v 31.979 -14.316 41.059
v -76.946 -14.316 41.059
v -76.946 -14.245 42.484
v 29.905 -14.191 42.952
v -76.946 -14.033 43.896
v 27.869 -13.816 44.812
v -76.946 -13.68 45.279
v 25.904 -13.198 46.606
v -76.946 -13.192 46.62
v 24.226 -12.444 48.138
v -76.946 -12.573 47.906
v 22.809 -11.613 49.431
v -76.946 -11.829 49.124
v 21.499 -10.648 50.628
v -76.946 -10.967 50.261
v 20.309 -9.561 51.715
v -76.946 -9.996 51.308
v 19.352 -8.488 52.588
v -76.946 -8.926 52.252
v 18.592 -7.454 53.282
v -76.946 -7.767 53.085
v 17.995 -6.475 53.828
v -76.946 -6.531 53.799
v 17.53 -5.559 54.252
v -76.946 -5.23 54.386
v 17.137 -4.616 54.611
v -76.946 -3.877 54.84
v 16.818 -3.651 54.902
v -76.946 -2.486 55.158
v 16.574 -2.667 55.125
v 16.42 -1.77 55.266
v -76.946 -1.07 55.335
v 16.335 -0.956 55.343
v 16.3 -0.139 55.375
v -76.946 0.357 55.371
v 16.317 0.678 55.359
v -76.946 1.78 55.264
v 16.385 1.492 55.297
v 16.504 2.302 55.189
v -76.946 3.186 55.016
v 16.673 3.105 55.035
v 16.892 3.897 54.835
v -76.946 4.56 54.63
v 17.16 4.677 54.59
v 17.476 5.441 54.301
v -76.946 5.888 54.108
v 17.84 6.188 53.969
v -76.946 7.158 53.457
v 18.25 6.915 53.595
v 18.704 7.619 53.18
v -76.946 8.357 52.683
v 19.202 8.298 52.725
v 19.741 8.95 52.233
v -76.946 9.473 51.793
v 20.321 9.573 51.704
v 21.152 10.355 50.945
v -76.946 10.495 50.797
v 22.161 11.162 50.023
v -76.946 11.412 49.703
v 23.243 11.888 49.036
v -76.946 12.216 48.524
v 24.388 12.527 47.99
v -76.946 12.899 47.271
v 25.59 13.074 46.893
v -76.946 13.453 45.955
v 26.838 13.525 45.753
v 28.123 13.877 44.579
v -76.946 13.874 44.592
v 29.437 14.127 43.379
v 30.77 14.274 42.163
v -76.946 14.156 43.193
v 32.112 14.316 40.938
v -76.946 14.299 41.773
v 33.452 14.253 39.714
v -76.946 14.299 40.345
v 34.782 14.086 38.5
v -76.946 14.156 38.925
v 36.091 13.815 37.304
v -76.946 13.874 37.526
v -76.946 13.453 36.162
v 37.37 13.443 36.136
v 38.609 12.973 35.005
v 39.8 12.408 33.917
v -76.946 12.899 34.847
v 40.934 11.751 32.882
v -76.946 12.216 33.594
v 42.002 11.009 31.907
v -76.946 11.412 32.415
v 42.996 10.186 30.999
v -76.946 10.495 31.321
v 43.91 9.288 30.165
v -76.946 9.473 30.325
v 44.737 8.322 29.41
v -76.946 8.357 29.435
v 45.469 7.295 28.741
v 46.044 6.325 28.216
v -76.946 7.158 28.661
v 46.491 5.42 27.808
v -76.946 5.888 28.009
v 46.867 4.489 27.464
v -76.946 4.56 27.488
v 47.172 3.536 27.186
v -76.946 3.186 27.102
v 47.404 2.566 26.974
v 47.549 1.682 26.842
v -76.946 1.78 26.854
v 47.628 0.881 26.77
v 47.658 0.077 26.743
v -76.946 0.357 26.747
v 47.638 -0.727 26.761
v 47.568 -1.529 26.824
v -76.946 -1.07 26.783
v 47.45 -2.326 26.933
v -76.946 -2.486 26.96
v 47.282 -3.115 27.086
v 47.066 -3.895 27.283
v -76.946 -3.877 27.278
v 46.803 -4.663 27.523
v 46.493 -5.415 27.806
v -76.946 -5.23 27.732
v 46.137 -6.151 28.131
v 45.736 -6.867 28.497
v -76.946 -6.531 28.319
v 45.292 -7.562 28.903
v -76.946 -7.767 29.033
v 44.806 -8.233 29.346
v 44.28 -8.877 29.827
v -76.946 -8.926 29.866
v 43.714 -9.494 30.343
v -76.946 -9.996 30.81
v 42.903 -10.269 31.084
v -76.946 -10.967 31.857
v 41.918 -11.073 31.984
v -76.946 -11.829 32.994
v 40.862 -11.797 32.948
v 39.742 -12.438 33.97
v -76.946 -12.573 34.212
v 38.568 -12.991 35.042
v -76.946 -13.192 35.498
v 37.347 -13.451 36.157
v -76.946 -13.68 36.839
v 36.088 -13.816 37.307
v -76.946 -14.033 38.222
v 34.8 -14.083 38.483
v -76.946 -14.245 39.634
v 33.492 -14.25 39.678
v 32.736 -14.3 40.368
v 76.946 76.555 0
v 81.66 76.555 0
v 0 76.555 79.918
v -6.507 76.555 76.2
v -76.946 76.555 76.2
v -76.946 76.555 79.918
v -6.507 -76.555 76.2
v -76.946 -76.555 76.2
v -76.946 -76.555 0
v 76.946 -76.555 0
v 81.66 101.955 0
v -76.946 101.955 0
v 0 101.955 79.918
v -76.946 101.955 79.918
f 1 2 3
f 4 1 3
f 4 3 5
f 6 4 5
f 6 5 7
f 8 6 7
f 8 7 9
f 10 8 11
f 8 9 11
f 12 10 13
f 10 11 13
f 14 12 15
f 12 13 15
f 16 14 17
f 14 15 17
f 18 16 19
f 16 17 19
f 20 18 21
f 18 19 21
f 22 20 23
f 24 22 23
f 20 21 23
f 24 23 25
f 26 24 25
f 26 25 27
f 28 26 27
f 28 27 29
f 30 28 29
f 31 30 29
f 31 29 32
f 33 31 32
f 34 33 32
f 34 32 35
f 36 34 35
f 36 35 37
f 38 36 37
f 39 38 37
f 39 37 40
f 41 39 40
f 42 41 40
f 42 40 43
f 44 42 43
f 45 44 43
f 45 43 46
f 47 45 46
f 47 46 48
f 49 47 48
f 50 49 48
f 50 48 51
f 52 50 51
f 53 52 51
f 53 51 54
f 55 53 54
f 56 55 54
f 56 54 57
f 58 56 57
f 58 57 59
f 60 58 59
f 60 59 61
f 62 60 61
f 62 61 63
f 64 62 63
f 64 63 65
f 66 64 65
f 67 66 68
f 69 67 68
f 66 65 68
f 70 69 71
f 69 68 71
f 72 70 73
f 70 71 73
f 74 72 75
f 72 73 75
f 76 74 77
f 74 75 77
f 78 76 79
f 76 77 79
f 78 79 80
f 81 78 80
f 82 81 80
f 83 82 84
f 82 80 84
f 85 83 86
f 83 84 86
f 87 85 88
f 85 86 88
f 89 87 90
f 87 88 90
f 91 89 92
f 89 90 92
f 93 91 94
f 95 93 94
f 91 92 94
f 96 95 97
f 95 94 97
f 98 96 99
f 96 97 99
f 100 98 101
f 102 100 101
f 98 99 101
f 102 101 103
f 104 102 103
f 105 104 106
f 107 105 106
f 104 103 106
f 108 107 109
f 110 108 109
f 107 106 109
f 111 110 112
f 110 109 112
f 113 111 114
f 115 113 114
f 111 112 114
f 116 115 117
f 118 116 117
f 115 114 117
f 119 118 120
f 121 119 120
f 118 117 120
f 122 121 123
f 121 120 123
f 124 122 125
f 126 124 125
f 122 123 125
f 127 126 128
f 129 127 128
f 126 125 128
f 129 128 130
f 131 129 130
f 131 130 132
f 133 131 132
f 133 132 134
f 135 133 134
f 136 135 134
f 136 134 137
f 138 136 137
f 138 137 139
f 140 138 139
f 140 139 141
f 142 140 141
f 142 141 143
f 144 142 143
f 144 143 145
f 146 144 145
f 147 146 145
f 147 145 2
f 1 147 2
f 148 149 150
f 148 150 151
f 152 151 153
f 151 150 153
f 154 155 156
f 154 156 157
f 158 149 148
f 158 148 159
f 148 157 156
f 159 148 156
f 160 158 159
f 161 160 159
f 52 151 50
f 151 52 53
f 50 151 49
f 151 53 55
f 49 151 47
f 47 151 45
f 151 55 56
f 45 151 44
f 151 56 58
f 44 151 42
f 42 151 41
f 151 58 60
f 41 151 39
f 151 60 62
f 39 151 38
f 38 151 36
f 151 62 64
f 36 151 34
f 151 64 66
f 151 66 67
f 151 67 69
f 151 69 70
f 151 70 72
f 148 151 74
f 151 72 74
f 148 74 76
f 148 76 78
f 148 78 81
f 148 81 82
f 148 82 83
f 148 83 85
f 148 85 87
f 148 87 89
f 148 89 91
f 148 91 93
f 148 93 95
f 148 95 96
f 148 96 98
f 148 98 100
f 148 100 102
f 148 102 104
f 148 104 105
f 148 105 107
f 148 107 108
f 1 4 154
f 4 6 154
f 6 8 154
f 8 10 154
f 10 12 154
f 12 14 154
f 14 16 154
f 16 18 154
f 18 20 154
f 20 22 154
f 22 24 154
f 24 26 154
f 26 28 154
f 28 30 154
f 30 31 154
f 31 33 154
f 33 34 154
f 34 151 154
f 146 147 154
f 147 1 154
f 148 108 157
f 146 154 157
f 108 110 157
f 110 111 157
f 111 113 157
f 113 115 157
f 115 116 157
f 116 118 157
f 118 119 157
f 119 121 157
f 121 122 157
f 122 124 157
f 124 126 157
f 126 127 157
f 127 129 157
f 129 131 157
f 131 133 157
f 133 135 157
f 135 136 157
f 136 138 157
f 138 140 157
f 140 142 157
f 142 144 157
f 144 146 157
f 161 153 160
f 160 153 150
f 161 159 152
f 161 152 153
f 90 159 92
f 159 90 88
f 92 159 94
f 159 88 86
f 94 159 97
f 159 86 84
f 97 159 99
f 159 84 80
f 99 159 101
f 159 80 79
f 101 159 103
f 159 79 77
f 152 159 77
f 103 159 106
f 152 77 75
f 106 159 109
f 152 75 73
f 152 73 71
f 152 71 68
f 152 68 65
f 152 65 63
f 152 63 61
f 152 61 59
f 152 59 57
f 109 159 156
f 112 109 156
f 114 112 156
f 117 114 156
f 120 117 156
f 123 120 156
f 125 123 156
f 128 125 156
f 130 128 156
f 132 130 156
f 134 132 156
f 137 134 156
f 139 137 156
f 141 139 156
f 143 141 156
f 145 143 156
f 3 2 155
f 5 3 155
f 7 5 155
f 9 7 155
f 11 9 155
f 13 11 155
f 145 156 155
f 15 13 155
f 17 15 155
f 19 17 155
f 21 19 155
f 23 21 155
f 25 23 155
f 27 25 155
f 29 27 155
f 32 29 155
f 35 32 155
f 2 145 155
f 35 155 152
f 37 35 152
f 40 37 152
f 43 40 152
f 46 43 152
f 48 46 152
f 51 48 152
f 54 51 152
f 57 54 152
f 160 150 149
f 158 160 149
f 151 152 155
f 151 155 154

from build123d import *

# Parameters (mm, degrees)
F0_W     = 153.8918465376
F0_H     = 153.1105190516
F1_DEPTH = 76.2
F3_DEPTH = 254
F4_R     = 14.3164019678
F5_DEPTH = 508
F7_DEPTH = 25.4
F9_DEPTH = 63.5


with BuildPart() as f1:
    # F0 (on Top) → F1 (new body)
    with BuildSketch(Plane.XY):
        Rectangle(F0_W, F0_H)
    extrude(amount=F1_DEPTH)

    # F2 (on face) → F3 (cut, symmetric)
    with BuildSketch(Plane.XZ.offset(76.5552595258)):
        Polygon((76.9459232688, 76.2), (-6.5071131103, 76.2), (76.9459232688, 0), align=None)
    extrude(amount=F3_DEPTH, both=True, mode=Mode.SUBTRACT)

    # F4 (on face) → F5 (cut)
    with BuildSketch(Plane(origin=(-76.9459232688, 0, 0), x_dir=(0, -1, 0), z_dir=(-1, 0, 0))):
        with Locations((0, 41.0589724779)):
            Circle(F4_R)
    extrude(amount=-F5_DEPTH, mode=Mode.SUBTRACT)

    # F6 (on face) → F7 (join)
    with BuildSketch(Plane(origin=(0, 76.5552595258, 0), x_dir=(-1, 0, 0), z_dir=(0, 1, 0))):
        Polygon((-81.6596895456, 0), (-76.9459232688, 0), (6.5071131103, 76.2), (76.9459232688, 76.2), (76.9459232688, 79.9183472991), (-81.6596895456, 79.9183472991), align=None)
        Polygon((-76.9459232688, 0), (76.9459232688, 0), (76.9459232688, 76.2), (6.5071131103, 76.2), align=None)
    extrude(amount=F7_DEPTH)

    # F8 (on face) → F9 (cut, symmetric)
    with BuildSketch(Plane.XZ.offset(-76.5552595258)):
        Polygon((0, 79.9183472991), (81.6596895456, 0), (81.6596895456, 79.9183472991), align=None)
    extrude(amount=F9_DEPTH, both=True, mode=Mode.SUBTRACT)


solid = f1.part
